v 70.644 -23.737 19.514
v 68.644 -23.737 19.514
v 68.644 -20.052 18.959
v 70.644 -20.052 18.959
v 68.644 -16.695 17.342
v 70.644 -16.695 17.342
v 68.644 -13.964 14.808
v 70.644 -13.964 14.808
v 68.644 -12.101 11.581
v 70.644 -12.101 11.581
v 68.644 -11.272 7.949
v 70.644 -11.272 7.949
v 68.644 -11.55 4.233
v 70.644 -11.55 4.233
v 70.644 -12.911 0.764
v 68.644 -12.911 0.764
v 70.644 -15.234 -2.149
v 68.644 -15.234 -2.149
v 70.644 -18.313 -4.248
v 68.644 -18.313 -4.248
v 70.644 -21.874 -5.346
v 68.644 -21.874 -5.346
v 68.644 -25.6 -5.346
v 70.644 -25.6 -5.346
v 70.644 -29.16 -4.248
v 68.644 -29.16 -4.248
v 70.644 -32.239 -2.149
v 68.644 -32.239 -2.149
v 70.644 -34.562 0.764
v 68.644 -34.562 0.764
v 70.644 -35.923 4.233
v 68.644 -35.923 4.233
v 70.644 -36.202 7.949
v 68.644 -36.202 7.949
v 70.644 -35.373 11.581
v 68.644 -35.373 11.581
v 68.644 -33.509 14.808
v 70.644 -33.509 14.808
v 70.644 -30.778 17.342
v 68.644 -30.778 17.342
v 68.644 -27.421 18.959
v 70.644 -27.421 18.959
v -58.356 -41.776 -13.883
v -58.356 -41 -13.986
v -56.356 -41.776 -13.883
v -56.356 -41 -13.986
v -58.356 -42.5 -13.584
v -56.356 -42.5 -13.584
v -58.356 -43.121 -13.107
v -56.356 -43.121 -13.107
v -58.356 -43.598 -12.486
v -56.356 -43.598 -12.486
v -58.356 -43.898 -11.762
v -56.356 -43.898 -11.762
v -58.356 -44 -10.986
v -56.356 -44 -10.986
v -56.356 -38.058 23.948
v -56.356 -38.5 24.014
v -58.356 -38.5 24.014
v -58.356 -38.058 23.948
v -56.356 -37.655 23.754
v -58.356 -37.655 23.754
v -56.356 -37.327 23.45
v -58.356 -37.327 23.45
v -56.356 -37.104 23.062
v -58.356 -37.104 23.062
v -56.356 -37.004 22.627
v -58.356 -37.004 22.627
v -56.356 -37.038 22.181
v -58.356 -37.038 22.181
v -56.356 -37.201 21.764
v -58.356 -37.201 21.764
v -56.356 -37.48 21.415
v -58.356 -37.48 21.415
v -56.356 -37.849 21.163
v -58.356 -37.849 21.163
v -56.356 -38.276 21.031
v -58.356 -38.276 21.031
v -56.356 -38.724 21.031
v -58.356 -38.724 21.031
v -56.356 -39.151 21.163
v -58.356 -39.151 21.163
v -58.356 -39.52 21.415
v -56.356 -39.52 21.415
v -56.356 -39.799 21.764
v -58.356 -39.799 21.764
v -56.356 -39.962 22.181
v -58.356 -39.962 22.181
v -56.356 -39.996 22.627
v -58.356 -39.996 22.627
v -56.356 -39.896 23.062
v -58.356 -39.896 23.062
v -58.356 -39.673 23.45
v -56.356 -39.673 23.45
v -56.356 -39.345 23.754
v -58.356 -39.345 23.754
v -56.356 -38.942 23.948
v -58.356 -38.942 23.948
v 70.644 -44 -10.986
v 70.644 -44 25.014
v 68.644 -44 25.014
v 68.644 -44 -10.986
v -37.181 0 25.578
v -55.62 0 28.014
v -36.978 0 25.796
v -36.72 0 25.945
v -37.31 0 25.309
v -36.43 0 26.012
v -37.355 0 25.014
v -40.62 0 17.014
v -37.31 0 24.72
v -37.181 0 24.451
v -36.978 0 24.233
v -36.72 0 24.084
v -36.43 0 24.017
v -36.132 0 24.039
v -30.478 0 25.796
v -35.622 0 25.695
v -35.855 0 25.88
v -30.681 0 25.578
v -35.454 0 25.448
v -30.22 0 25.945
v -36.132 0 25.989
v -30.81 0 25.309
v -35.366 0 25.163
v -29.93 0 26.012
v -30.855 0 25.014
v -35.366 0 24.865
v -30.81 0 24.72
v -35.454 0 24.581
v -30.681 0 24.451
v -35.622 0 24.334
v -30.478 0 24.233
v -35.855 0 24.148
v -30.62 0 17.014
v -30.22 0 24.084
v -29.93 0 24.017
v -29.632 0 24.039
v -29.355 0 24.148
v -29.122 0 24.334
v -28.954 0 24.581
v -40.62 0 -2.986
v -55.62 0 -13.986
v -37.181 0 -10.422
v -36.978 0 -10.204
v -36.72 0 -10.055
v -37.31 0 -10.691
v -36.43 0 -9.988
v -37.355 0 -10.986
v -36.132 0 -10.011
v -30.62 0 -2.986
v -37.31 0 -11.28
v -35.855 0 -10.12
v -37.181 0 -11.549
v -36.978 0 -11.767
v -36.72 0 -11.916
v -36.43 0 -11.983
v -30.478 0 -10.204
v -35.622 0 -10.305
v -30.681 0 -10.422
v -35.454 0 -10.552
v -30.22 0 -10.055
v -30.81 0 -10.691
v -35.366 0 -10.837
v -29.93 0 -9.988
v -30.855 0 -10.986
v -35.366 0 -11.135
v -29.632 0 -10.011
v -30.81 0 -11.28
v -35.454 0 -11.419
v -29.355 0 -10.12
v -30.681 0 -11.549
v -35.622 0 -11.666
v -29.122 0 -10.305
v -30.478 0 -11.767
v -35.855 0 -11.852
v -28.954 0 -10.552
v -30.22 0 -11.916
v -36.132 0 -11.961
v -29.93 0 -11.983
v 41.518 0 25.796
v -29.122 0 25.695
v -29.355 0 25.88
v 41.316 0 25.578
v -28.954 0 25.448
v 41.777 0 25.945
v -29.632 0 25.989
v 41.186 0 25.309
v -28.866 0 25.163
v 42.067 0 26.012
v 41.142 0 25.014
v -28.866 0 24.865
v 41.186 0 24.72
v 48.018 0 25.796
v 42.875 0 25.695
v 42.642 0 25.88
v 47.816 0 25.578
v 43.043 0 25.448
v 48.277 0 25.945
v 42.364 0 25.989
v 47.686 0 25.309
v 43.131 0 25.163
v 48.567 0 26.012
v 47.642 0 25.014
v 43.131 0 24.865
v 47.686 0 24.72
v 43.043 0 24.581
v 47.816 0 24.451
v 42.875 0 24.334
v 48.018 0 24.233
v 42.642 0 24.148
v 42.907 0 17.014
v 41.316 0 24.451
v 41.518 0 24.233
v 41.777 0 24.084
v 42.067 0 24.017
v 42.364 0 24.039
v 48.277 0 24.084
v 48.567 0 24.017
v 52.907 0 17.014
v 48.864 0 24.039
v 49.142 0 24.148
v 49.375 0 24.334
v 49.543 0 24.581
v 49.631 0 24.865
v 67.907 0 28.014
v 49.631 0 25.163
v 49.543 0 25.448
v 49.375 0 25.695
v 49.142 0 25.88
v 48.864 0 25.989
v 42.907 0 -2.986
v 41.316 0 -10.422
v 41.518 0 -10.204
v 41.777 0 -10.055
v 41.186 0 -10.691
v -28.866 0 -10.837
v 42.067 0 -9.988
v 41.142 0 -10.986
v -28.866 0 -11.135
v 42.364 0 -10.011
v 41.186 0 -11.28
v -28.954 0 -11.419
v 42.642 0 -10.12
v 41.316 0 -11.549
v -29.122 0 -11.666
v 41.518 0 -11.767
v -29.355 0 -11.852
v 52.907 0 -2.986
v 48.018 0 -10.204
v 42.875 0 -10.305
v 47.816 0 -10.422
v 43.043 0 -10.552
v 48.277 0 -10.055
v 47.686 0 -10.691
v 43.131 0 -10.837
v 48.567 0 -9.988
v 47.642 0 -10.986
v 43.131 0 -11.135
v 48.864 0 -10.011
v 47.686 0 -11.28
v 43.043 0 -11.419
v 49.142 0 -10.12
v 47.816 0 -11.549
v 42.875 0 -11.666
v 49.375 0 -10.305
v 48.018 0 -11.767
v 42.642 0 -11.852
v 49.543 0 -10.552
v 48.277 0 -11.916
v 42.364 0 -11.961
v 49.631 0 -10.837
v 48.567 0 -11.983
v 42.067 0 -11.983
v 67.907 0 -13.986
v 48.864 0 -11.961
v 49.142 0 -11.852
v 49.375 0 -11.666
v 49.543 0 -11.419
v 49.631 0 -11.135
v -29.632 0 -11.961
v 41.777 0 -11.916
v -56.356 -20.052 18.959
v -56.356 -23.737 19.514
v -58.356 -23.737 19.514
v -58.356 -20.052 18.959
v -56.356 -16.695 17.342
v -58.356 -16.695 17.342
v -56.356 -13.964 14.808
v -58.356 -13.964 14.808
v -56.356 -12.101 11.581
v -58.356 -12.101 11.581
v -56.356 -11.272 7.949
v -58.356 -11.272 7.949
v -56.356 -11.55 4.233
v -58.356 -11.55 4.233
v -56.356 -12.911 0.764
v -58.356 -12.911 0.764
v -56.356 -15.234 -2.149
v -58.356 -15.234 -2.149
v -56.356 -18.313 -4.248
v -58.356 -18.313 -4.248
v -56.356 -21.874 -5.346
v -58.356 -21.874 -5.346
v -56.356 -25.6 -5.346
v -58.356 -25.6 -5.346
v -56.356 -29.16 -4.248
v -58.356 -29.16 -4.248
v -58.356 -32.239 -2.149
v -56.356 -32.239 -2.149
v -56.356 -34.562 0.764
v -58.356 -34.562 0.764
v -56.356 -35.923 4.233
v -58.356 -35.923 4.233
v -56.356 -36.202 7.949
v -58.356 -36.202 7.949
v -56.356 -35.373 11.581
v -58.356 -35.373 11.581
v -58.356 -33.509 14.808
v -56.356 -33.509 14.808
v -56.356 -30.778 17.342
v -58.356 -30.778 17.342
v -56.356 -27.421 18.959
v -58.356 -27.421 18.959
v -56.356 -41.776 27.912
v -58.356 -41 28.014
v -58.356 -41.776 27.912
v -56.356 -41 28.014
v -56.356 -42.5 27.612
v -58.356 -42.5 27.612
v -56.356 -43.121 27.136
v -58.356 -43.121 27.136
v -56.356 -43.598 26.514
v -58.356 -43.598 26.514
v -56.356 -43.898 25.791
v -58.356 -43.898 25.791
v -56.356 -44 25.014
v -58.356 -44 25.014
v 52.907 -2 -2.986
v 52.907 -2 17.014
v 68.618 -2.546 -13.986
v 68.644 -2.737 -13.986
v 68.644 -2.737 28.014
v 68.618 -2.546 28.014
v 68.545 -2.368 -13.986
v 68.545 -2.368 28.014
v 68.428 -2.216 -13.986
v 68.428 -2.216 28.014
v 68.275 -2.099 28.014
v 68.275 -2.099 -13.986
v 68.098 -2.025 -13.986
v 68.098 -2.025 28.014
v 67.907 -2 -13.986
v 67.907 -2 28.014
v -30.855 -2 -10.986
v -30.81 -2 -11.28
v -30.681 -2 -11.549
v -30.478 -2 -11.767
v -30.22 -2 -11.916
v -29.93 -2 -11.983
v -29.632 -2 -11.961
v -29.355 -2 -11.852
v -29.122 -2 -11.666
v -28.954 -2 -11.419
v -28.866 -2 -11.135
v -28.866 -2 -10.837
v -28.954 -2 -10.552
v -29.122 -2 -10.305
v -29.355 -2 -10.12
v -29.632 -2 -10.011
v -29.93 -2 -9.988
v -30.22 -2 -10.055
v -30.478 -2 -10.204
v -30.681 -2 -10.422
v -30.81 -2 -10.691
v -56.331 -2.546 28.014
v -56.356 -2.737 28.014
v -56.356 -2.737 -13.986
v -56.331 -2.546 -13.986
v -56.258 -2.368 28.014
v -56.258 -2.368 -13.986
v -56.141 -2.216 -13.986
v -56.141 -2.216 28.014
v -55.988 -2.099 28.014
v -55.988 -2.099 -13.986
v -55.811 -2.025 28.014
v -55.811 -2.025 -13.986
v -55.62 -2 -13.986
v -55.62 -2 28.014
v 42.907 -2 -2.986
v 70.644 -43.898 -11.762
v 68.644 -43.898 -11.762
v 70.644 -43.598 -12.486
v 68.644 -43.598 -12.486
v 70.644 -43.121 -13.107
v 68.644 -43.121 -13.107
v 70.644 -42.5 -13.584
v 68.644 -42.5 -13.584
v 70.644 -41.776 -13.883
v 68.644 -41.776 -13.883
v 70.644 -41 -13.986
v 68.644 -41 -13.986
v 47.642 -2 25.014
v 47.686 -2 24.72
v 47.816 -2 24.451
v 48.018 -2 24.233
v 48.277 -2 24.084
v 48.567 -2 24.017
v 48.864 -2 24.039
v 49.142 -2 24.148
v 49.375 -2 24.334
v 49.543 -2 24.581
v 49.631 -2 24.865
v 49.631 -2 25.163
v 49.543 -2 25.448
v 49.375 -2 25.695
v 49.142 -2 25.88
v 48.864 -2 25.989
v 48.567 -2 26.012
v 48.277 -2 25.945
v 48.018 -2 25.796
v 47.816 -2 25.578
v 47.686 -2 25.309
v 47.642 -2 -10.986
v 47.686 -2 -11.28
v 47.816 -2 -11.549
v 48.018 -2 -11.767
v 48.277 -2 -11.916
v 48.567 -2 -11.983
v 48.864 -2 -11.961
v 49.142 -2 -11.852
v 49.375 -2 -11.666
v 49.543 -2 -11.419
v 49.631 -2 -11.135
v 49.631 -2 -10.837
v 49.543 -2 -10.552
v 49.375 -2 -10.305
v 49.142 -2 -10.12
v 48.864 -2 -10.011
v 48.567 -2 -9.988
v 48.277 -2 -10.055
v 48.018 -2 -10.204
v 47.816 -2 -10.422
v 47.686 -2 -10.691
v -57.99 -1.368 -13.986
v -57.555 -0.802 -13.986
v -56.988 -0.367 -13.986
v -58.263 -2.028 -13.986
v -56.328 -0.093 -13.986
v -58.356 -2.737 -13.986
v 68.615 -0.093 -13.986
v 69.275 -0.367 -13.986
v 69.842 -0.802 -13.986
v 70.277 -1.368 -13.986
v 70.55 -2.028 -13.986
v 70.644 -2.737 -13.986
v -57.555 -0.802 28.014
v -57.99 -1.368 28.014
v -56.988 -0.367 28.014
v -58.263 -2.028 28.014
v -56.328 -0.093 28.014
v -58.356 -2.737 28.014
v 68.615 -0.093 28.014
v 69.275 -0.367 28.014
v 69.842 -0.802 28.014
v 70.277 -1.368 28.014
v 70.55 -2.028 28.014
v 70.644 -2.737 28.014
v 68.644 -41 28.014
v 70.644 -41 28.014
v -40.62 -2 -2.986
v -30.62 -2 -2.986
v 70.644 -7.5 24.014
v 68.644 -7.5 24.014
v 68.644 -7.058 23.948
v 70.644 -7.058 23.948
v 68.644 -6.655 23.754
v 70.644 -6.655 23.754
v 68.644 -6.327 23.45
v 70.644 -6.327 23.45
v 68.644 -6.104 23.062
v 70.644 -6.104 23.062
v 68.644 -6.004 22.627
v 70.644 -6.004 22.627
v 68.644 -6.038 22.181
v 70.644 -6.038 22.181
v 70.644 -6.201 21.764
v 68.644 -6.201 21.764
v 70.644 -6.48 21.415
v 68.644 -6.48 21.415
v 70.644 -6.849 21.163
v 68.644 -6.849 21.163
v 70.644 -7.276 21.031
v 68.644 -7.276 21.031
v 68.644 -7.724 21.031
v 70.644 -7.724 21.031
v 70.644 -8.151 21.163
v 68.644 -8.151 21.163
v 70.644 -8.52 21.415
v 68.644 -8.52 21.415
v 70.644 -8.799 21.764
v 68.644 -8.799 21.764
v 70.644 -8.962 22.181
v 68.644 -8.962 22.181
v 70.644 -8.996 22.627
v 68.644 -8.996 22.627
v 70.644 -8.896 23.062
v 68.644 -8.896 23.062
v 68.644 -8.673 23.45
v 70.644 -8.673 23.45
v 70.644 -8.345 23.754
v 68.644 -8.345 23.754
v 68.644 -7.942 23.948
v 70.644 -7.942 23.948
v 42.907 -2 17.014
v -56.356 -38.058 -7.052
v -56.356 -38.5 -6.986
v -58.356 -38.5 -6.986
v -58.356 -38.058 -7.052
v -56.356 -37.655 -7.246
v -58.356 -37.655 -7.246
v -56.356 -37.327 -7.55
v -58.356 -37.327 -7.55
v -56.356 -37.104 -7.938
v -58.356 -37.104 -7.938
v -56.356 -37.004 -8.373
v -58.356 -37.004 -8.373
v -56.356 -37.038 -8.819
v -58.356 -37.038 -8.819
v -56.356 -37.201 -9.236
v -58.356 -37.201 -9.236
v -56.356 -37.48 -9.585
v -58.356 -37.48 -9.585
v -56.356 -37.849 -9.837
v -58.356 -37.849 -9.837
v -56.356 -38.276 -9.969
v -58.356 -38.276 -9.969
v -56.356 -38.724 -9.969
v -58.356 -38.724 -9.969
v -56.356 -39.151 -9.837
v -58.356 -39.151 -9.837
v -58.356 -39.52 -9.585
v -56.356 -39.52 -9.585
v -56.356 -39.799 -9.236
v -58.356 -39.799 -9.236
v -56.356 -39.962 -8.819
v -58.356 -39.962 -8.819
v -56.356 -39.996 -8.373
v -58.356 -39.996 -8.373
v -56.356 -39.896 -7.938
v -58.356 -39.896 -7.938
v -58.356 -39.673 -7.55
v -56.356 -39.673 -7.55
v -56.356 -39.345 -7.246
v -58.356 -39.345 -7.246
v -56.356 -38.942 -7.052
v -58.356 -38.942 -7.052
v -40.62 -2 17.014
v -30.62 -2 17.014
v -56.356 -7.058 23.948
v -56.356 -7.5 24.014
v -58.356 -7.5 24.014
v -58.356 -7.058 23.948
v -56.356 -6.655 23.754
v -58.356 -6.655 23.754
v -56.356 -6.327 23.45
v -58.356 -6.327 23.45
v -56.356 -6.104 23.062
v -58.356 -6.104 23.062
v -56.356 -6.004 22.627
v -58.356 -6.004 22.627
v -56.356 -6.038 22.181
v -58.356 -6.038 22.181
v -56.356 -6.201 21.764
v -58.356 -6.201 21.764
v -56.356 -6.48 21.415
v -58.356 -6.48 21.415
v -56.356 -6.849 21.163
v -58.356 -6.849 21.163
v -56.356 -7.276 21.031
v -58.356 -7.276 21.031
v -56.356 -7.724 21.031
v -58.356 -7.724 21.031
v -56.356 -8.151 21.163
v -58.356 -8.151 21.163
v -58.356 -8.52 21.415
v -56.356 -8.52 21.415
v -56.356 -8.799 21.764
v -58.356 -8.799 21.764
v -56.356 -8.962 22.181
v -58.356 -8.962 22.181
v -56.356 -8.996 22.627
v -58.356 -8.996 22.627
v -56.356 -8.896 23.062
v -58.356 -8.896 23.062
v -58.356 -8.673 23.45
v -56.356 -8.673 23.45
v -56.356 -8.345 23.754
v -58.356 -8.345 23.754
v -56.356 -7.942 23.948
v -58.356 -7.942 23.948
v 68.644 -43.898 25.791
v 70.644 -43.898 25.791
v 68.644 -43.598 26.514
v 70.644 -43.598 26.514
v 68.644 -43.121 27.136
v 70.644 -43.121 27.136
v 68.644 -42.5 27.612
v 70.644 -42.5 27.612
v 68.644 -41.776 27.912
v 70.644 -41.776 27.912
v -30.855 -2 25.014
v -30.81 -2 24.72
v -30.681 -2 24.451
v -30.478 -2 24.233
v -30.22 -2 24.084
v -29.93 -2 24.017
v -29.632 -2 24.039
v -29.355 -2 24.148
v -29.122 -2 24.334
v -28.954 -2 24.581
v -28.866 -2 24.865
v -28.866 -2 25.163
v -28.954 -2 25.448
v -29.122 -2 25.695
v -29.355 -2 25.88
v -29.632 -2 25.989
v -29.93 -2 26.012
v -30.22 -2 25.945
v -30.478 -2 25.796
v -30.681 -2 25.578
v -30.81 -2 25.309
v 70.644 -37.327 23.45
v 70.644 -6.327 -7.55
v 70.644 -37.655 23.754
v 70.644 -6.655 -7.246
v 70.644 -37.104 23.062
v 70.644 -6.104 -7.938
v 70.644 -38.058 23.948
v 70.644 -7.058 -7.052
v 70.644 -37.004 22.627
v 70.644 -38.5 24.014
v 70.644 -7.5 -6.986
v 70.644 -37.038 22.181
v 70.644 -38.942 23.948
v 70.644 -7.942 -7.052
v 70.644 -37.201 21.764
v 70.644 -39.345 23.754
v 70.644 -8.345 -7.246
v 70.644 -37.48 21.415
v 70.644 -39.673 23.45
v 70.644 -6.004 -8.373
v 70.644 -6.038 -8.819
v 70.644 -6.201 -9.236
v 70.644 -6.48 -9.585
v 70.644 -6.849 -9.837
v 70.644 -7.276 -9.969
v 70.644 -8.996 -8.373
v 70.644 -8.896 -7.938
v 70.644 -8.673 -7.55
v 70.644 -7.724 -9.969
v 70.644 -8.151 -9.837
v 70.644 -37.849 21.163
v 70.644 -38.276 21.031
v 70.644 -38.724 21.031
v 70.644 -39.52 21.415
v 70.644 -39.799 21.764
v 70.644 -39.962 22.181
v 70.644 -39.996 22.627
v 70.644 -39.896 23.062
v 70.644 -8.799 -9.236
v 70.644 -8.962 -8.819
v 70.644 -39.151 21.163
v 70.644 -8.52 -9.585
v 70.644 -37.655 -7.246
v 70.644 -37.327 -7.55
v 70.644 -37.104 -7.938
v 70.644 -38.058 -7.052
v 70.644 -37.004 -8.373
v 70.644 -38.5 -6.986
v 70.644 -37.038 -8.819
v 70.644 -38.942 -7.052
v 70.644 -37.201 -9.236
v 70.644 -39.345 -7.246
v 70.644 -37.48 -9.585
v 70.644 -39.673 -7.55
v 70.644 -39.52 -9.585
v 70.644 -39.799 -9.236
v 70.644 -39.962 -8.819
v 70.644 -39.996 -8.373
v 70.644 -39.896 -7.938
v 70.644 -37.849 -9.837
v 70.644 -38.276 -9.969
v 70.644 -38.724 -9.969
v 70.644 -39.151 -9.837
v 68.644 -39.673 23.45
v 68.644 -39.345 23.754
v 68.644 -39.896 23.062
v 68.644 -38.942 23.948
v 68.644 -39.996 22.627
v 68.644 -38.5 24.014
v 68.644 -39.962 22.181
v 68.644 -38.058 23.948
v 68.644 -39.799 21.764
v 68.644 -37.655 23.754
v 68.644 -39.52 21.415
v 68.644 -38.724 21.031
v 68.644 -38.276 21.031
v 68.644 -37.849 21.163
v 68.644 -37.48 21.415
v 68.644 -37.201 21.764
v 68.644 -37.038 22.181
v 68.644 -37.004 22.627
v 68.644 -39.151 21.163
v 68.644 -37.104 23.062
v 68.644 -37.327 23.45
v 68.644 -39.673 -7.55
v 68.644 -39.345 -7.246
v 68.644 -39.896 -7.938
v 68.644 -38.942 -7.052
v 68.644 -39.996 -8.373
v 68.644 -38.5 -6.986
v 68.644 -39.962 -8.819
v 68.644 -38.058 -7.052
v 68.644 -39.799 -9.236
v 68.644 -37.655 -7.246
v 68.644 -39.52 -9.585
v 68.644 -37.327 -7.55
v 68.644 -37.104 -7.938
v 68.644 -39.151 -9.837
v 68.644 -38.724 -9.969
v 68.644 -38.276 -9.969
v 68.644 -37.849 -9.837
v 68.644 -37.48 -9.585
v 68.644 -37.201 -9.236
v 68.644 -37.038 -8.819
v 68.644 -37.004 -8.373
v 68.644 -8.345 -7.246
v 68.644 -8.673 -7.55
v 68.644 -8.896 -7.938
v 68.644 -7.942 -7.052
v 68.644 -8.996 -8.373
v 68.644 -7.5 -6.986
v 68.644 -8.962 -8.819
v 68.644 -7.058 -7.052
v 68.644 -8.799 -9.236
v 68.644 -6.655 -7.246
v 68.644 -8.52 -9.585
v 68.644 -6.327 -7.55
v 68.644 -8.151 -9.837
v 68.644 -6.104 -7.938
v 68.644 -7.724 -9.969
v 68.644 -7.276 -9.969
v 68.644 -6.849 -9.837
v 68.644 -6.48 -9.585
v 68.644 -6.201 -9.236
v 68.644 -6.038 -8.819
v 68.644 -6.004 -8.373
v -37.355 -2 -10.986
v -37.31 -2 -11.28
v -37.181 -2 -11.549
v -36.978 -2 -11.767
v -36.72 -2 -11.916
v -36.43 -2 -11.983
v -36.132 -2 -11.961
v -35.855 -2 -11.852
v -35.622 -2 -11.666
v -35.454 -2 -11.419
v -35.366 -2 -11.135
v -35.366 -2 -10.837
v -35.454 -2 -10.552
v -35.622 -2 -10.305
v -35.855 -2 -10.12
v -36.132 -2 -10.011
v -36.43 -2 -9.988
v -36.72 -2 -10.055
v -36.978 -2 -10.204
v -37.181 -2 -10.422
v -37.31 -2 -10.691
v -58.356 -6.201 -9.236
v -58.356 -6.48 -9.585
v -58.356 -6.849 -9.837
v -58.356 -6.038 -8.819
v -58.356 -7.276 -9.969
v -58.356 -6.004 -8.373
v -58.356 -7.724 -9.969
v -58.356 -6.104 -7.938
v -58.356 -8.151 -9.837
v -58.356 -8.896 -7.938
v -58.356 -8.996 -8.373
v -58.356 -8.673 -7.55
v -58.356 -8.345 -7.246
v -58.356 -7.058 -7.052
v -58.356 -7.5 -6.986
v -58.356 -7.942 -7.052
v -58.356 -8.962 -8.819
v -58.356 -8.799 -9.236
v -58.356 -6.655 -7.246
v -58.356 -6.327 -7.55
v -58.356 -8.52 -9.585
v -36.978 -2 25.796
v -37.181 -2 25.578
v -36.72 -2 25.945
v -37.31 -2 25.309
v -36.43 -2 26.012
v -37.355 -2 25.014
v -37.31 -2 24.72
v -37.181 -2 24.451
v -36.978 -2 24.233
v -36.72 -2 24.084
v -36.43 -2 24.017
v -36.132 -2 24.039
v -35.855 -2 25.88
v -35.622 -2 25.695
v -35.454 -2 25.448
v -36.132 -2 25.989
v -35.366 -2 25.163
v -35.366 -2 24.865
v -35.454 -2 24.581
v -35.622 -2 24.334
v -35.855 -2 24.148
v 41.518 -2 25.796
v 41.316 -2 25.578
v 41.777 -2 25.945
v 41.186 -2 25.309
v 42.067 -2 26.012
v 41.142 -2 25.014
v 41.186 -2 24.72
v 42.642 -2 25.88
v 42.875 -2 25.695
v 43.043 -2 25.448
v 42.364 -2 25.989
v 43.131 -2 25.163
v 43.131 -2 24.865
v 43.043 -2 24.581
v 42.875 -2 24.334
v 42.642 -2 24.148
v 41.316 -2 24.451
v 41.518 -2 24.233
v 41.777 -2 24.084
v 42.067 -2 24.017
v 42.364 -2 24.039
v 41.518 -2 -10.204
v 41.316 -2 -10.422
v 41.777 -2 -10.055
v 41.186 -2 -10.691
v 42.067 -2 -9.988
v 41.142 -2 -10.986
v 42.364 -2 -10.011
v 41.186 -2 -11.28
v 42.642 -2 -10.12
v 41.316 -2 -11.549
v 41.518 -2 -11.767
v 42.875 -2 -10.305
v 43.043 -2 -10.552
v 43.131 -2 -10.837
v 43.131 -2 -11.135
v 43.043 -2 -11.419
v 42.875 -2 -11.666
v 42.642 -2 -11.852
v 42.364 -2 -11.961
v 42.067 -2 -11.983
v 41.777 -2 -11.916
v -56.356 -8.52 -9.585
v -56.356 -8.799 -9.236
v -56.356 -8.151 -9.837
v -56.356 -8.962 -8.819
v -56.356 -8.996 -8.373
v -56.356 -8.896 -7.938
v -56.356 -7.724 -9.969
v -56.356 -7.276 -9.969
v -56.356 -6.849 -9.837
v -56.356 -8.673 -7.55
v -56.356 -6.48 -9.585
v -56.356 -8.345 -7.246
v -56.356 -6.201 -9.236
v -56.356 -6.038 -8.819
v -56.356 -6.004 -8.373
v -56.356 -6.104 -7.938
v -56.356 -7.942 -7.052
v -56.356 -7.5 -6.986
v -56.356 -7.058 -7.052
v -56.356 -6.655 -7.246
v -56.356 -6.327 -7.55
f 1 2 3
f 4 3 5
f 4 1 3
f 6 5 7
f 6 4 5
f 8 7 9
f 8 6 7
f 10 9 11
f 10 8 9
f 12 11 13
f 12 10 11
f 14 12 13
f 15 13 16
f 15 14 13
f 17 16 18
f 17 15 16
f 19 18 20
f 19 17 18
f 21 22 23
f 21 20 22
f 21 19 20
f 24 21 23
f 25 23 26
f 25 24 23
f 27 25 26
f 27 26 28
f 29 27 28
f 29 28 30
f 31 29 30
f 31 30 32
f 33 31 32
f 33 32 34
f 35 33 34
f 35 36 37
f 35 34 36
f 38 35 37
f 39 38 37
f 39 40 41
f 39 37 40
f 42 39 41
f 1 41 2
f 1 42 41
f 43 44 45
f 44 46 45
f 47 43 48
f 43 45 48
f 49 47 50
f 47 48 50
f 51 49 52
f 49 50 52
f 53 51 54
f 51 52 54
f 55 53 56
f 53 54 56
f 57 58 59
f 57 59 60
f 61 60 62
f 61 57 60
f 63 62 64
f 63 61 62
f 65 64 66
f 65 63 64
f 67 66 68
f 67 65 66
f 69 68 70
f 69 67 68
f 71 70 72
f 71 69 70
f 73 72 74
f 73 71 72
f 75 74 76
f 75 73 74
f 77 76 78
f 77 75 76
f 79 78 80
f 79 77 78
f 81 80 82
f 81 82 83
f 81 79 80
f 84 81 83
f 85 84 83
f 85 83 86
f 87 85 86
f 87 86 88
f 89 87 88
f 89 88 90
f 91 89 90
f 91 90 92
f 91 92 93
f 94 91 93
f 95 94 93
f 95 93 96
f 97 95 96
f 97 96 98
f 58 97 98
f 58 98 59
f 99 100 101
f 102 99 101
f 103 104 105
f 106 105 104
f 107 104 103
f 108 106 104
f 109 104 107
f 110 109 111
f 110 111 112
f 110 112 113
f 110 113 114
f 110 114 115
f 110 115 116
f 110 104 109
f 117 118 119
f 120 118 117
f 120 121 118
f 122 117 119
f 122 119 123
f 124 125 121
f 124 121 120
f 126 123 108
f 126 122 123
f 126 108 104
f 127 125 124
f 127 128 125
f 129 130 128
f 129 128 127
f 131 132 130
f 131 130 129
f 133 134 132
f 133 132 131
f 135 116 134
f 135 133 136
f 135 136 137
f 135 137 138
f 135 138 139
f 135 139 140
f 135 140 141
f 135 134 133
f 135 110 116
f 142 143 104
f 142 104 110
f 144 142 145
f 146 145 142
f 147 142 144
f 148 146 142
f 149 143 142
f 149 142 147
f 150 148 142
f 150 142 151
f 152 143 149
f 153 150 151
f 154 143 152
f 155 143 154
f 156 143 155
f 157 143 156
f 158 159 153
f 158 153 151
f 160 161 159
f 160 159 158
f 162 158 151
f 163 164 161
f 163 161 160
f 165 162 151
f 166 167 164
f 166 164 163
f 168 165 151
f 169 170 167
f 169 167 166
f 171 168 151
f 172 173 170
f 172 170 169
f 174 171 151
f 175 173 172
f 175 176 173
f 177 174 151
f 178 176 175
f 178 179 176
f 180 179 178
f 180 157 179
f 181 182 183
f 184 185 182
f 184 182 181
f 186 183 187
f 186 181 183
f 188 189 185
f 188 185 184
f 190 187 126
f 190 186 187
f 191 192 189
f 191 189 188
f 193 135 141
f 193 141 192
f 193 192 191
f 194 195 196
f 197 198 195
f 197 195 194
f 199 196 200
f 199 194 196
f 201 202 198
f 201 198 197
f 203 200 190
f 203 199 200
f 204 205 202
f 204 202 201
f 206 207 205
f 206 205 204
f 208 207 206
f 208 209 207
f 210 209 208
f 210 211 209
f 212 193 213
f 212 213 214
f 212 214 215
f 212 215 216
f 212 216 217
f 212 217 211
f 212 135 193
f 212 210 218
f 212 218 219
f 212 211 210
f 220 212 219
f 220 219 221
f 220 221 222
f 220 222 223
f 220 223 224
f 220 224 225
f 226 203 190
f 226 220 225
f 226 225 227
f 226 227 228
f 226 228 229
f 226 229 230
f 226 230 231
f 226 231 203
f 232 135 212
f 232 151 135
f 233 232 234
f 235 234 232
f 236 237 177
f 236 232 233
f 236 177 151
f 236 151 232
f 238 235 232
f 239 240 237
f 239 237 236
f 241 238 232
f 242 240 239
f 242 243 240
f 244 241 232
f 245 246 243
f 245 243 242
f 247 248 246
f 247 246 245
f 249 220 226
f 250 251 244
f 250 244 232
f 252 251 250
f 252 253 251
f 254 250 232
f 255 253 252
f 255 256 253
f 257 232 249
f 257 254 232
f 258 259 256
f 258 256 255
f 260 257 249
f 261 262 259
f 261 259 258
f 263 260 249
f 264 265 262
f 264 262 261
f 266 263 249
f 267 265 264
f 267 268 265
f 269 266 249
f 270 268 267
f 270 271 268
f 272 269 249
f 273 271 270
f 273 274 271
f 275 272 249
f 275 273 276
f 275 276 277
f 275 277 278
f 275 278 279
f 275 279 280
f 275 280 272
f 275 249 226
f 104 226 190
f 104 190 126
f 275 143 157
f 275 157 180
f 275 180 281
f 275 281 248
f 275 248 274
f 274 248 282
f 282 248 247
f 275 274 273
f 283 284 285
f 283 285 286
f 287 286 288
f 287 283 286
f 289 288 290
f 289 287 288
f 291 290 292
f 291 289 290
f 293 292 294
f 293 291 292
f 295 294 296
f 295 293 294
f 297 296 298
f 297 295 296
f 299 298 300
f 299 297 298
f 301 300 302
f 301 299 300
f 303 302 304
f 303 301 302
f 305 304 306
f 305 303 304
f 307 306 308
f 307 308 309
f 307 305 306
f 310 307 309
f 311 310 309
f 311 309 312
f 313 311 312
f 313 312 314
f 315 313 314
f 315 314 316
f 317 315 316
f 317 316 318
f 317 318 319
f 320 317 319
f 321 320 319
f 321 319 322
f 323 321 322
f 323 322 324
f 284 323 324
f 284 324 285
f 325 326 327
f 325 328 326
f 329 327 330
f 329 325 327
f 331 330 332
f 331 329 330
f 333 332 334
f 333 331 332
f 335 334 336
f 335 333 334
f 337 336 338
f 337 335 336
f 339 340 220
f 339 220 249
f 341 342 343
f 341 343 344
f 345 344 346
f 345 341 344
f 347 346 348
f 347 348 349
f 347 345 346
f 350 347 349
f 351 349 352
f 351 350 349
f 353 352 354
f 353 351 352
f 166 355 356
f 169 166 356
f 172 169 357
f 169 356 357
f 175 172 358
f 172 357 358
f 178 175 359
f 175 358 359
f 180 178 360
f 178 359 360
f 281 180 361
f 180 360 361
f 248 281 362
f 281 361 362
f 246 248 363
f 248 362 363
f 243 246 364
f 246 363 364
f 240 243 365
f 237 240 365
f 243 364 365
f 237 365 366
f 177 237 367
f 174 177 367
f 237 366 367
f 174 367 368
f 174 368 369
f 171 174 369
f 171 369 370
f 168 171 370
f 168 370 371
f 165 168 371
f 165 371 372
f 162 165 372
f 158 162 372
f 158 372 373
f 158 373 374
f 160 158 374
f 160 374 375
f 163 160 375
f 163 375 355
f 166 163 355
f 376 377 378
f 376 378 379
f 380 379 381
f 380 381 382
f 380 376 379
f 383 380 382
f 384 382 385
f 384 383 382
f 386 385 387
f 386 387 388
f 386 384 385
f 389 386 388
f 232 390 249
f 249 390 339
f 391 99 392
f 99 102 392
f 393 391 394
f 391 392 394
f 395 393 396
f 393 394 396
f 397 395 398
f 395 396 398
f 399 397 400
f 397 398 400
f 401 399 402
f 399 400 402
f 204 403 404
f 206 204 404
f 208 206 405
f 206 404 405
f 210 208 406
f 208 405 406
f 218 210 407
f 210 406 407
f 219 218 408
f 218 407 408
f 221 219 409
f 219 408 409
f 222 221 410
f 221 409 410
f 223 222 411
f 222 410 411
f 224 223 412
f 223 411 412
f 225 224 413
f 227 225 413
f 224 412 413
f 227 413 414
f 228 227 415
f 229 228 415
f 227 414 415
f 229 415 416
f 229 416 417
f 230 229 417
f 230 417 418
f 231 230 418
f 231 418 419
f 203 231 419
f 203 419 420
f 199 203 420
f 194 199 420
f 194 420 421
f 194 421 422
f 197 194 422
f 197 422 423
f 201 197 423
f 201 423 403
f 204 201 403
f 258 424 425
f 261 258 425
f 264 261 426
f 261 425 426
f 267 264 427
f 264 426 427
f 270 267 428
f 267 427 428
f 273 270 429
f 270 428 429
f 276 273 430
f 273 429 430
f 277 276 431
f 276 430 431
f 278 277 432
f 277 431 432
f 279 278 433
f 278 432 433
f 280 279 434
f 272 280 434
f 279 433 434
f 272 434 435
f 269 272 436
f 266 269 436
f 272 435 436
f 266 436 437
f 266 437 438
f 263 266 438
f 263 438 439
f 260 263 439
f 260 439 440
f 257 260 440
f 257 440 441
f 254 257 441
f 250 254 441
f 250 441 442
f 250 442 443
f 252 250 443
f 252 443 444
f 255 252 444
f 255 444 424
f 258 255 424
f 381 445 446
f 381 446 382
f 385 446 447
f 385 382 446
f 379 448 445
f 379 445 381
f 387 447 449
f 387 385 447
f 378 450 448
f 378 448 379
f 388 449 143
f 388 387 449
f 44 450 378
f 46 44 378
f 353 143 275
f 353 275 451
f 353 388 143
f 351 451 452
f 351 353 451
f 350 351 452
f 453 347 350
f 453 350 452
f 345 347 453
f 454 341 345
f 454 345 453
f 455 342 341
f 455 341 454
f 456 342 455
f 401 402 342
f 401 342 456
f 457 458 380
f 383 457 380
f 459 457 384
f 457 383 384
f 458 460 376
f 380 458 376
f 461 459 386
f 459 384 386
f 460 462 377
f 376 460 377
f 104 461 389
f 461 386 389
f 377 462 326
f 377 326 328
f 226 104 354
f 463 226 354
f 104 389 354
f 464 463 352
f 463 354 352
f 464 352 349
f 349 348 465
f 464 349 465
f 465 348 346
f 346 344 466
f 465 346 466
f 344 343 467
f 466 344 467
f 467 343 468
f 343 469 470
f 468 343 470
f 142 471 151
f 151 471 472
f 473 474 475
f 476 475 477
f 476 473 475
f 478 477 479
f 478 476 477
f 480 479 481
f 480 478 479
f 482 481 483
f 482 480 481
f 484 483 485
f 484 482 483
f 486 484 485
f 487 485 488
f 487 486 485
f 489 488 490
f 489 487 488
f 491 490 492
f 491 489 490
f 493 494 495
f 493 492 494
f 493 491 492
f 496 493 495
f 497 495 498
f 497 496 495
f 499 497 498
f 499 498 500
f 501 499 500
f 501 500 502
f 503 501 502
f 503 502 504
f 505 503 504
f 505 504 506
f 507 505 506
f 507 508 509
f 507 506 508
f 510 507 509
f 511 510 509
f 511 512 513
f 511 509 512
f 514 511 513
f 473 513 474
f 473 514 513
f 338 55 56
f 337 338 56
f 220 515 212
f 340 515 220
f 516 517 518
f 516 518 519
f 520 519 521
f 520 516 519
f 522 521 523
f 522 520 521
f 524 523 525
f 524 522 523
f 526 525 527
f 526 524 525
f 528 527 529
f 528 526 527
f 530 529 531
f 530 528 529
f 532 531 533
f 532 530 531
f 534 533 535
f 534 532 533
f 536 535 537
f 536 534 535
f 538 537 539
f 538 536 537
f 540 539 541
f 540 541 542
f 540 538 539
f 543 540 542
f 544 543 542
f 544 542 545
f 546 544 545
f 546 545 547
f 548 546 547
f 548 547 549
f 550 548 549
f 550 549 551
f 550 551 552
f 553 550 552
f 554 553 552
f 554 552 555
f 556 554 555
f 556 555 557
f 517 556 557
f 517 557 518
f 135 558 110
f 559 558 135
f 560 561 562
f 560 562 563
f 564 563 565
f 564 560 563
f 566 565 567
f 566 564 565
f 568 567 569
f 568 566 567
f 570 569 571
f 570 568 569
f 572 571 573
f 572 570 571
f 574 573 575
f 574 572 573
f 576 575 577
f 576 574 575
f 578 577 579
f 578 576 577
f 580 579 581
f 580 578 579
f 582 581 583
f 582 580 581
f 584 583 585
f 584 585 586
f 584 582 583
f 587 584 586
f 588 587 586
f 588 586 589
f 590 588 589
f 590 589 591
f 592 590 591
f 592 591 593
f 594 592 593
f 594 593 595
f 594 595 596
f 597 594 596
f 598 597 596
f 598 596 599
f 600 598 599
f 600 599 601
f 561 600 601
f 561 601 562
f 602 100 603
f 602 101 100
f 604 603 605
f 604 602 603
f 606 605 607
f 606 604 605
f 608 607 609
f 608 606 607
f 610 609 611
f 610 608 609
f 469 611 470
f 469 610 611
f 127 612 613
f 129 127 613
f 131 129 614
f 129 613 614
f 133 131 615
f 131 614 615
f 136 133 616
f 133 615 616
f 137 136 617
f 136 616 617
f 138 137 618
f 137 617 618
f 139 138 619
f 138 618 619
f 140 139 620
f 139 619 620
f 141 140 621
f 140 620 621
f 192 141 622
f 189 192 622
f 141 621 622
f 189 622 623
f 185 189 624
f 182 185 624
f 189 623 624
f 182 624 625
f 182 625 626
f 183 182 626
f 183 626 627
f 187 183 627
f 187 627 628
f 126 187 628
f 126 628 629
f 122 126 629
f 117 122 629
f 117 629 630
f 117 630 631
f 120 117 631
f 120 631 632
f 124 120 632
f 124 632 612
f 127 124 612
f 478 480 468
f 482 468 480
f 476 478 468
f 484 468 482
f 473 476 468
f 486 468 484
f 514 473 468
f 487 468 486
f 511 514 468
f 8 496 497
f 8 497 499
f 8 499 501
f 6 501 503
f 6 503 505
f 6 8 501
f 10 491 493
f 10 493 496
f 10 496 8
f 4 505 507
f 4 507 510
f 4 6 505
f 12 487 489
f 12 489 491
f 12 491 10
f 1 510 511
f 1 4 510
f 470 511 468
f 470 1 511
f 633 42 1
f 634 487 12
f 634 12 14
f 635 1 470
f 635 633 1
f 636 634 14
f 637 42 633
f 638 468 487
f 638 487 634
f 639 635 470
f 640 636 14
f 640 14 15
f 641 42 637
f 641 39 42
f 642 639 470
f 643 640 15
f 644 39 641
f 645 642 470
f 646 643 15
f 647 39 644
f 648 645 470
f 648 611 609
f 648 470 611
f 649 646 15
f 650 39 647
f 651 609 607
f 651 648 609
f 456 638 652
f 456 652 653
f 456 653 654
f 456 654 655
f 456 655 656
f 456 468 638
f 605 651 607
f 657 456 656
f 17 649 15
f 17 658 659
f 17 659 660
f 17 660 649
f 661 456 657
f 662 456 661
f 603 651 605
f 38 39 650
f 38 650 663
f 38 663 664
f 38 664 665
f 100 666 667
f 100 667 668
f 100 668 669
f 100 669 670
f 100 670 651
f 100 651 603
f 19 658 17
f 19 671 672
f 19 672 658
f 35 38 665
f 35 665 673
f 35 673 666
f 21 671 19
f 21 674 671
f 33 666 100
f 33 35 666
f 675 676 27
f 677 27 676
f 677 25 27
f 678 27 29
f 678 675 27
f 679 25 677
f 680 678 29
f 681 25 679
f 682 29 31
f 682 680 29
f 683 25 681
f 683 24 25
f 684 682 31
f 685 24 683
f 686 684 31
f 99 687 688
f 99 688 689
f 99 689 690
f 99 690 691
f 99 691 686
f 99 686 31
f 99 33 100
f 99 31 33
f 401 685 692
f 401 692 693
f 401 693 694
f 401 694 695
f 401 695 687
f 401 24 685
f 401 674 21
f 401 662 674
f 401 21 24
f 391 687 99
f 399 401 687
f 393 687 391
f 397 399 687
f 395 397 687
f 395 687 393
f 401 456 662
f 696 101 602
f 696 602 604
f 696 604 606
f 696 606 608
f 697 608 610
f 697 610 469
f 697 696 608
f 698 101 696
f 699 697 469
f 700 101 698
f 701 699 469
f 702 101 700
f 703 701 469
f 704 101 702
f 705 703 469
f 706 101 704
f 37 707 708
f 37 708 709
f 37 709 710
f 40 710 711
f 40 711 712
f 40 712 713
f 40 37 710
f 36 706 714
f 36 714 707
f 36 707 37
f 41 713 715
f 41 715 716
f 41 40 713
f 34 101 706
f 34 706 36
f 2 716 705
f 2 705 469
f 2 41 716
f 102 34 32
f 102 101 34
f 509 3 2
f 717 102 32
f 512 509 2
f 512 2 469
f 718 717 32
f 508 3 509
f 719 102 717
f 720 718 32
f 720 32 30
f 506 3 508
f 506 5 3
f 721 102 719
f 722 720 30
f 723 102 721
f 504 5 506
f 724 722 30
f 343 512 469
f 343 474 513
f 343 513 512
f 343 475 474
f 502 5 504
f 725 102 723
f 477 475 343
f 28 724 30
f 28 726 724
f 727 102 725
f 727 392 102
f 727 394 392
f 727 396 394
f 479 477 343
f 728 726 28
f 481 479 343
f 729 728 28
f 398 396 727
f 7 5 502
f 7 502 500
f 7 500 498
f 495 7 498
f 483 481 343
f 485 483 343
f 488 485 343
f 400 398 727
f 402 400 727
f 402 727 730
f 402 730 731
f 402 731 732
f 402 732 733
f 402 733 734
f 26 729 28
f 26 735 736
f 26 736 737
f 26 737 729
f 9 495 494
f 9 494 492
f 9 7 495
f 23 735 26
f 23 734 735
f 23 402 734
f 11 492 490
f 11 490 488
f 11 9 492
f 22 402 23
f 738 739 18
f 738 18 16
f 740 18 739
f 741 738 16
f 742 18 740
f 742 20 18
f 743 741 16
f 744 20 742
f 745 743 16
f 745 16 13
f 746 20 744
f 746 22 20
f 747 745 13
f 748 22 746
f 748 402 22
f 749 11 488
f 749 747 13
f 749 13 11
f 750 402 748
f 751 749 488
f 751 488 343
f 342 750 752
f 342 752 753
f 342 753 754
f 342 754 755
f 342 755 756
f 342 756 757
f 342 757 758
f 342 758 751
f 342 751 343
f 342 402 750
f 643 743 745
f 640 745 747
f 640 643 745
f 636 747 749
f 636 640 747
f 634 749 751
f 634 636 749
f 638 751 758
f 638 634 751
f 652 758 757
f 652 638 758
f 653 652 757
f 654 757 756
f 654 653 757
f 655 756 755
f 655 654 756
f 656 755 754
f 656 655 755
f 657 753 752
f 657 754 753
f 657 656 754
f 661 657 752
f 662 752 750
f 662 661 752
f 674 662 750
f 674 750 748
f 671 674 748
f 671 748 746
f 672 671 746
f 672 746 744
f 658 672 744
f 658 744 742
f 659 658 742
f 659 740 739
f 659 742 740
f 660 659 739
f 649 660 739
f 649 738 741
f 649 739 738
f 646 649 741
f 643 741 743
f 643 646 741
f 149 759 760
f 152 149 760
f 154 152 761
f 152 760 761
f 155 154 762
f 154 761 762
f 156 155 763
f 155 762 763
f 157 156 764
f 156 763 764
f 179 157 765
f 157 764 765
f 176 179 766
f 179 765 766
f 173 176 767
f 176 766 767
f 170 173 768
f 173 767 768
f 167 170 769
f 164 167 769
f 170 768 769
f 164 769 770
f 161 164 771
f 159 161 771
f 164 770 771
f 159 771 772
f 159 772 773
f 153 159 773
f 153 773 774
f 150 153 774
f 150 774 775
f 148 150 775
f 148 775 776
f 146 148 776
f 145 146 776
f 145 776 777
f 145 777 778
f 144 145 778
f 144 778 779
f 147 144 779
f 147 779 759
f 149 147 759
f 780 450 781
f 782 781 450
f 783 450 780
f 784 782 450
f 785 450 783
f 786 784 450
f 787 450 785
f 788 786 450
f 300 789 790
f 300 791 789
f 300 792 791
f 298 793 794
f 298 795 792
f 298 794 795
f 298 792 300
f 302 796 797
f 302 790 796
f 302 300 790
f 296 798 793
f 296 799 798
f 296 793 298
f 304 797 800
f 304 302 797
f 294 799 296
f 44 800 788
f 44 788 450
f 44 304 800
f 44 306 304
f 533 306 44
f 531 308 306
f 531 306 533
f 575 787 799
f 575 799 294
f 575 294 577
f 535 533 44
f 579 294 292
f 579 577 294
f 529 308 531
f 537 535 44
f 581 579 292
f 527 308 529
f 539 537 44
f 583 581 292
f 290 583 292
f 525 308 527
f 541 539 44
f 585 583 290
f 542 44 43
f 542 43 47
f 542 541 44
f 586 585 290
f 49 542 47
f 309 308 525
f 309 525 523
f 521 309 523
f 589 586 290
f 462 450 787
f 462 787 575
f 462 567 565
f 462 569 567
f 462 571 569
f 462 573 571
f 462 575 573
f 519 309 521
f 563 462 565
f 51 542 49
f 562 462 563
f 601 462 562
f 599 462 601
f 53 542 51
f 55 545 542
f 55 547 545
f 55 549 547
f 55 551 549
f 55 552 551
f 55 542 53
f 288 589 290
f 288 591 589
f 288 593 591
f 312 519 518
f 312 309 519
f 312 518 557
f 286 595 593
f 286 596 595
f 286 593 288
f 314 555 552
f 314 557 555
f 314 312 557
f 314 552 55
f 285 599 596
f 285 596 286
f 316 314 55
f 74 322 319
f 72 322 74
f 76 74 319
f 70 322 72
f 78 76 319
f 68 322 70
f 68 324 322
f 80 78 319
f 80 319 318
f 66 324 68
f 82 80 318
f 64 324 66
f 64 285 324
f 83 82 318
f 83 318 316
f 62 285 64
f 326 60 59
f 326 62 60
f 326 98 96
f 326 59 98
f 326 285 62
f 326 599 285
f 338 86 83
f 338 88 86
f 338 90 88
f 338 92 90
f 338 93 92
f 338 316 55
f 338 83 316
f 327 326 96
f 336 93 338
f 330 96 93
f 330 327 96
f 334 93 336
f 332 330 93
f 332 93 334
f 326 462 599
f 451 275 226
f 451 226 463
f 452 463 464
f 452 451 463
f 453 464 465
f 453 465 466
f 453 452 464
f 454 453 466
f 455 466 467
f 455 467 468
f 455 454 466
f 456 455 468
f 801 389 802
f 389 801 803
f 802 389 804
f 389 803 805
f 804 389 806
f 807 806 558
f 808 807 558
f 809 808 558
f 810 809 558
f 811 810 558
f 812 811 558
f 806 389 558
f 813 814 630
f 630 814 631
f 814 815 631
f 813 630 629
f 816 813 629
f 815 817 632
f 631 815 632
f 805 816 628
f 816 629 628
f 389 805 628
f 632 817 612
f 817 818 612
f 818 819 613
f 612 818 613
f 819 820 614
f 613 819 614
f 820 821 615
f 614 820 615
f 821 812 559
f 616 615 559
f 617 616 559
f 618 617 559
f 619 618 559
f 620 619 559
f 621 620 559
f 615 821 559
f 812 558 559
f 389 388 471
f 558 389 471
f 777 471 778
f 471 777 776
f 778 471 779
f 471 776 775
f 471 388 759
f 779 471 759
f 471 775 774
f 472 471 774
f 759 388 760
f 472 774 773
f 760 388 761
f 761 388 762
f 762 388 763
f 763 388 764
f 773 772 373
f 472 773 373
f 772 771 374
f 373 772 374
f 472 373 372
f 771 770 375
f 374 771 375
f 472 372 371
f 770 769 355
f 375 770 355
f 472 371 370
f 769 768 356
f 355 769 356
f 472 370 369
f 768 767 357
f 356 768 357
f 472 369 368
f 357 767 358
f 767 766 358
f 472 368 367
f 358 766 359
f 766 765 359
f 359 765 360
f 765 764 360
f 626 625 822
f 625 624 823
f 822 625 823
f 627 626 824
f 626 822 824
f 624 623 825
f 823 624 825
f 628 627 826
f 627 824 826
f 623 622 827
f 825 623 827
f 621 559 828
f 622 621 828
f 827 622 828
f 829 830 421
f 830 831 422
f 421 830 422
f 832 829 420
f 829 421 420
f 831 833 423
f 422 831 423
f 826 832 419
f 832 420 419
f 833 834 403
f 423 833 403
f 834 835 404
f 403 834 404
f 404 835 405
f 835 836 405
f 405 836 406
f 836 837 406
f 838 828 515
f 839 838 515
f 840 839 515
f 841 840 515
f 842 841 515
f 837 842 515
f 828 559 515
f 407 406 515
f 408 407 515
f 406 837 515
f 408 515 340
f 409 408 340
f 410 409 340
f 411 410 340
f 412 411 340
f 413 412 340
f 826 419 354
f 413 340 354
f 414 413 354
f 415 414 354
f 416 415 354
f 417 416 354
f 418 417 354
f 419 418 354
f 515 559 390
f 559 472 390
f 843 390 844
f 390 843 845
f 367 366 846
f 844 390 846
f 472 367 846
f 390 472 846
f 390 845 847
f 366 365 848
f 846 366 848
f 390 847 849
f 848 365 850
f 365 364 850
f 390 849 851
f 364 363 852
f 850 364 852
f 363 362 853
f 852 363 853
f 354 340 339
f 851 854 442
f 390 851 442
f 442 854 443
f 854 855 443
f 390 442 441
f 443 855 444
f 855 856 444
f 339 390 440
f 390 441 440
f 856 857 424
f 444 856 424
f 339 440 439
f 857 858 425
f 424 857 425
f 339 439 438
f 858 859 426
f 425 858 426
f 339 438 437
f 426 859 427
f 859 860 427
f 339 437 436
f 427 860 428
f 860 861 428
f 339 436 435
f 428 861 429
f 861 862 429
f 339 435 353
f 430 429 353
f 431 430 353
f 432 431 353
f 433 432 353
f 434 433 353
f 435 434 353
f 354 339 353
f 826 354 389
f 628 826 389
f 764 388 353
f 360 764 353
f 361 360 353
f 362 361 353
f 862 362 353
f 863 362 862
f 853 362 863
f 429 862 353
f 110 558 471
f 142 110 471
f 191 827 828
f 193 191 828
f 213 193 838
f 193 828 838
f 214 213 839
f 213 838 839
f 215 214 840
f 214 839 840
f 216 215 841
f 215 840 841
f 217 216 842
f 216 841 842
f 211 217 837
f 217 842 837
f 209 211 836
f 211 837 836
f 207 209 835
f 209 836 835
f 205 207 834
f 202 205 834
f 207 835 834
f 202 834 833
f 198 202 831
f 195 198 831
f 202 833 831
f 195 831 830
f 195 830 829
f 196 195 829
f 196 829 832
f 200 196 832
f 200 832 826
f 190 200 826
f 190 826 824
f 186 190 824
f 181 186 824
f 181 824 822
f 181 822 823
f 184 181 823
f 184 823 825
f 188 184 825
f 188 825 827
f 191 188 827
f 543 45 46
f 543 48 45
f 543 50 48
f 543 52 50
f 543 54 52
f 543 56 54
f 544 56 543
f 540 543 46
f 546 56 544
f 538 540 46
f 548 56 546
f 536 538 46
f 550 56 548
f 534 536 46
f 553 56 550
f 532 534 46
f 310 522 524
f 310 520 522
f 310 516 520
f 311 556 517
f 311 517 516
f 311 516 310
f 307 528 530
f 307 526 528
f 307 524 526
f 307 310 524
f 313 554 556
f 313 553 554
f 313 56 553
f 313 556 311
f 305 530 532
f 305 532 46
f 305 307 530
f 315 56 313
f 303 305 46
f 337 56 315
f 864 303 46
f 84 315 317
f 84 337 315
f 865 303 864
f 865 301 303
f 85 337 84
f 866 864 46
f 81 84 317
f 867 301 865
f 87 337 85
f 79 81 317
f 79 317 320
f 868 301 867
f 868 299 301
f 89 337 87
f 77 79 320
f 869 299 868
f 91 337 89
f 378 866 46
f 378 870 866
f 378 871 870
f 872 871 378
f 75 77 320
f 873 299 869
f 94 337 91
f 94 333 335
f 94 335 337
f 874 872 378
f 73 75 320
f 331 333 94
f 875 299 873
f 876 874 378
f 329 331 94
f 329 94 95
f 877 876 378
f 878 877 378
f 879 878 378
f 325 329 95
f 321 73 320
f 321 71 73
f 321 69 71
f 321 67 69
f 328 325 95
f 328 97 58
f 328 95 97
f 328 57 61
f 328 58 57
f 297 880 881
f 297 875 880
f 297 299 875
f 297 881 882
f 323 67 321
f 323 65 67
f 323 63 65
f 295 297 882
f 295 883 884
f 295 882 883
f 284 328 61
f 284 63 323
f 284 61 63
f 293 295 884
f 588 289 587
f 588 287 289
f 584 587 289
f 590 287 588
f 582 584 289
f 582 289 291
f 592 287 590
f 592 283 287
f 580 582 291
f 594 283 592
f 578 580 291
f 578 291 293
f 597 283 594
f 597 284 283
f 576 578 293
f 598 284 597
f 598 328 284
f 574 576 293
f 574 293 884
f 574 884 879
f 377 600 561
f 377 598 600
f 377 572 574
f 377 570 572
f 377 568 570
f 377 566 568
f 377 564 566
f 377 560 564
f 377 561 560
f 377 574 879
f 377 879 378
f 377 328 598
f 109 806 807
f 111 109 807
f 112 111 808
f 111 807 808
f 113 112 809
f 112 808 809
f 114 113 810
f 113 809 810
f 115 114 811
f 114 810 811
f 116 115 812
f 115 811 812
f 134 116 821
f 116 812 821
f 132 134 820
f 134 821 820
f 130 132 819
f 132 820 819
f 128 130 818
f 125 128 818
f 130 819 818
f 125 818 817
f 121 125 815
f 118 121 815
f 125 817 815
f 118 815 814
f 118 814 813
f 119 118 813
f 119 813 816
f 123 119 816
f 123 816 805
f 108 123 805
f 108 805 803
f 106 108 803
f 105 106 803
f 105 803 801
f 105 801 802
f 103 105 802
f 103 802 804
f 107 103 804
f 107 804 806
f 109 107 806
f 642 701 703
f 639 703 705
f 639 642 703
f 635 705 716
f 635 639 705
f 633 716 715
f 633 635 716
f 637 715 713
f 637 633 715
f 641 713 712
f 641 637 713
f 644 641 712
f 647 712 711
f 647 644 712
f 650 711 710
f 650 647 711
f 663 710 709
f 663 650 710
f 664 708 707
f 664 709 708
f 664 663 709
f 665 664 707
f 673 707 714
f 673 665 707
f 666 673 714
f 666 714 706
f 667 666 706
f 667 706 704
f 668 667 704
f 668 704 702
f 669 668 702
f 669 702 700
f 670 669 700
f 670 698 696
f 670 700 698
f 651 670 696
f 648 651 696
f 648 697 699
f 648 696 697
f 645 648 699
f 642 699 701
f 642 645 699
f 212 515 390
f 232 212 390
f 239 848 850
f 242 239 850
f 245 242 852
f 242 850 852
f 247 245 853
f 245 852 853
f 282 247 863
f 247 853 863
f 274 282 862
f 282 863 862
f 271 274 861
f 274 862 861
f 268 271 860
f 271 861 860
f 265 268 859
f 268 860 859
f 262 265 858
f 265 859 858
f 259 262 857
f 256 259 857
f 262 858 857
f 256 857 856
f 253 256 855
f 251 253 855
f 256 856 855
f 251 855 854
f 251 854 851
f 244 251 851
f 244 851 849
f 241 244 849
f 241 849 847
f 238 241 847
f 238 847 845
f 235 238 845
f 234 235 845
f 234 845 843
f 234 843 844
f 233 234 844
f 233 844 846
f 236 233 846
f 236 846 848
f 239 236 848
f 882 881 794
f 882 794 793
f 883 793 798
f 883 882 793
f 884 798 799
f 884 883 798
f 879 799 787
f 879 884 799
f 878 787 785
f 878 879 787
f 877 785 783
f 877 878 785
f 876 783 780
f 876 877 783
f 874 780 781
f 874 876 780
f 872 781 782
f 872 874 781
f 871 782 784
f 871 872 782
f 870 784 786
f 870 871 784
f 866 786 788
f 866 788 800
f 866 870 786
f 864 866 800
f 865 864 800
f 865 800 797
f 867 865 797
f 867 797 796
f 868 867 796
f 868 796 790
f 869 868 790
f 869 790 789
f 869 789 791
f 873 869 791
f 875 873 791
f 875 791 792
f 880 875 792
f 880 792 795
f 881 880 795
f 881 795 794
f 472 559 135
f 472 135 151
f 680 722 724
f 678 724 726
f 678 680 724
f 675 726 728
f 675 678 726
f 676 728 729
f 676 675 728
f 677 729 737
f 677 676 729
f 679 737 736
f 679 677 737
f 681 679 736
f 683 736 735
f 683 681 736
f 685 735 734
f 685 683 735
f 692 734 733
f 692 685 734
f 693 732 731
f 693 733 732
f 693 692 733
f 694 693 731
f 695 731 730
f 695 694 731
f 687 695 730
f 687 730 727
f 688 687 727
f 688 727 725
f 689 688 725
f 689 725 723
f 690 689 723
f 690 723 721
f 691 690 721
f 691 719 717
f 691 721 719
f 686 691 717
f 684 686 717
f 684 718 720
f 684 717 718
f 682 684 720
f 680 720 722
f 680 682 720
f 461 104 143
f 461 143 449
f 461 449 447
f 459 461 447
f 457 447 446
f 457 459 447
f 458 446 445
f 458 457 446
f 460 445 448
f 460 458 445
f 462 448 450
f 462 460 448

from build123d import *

# Parameters (mm, degrees)
SKETCH_1_W                         = 125
SKETCH_1_H                         = 42
SM_BASE_FLANGE_490_DEPTH           = 2
SM_EDGE_FLANGE_503_STRIP_W         = 9.4732
SM_EDGE_FLANGE_503_STRIP_H         = 2
SM_EDGE_FLANGE_503_STRIP_CUT_DEPTH = 42
SM_EDGE_FLANGE_503_DEPTH           = 42
SM_EDGE_FLANGE_662_STRIP_W         = 9.4732
SM_EDGE_FLANGE_662_STRIP_H         = 2
SM_EDGE_FLANGE_662_STRIP_CUT_DEPTH = 42
SM_EDGE_FLANGE_662_DEPTH           = 42
FILLET_810_R                       = 3
EXTRUDE_START                      = -129
EXTRUDE_1524_OUTLINE_R             = 1.5
EXTRUDE_1524_OUTLINE_R_2           = 12.5
EXTRUDE_1524_DEPTH                 = 129
EXTRUDE_START_2                    = -2
EXTRUDE_2057_OUTLINE_W             = 10
EXTRUDE_2057_OUTLINE_H             = 20
EXTRUDE_2057_DEPTH                 = 2
HOLE_WIZARD_M2_D                   = 2


# Read off the part's stored shape, not the designer's step: 电机螺丝孔, 车架接口
# Sheet-metal steps are written as plain solids
with BuildPart() as part:
    # Sketch 1 → Sm Base Flange 490 (new body)
    with BuildSketch(Plane(origin=(0, 0, 0), x_dir=(1, 0, 0), z_dir=(0, 1, 0))):
        with Locations((6.143518865, -7.014413587)):
            Rectangle(SKETCH_1_W, SKETCH_1_H)
    extrude(amount=-SM_BASE_FLANGE_490_DEPTH)

    # Sm Edge Flange 503 strip (across the edge) → Sm Edge Flange 503 strip cut (cut)
    with BuildSketch(Plane(origin=(-56.356481135, -2, 28.014413587), x_dir=(1, 0, 0), z_dir=(0, 0, -1))):
        with Locations((-4, -1)):
            Rectangle(SM_EDGE_FLANGE_503_STRIP_W, SM_EDGE_FLANGE_503_STRIP_H)
    extrude(amount=SM_EDGE_FLANGE_503_STRIP_CUT_DEPTH, mode=Mode.SUBTRACT)

    # Sm Edge Flange 503 section (across the edge) → Sm Edge Flange 503 (add)
    with BuildSketch(Plane(origin=(-56.356481135, -2, 28.014413587), x_dir=(1, 0, 0), z_dir=(0, 0, -1))):
        with BuildLine():
            Line((-2, 0.7366), (-2, 42))
            Line((-2, 42), (0, 42))
            Line((0, 42), (0, 0.7366))
            ThreePointArc((0, 0.7366), (0.215745145, 0.215745145), (0.7366, 0))
            Line((0.7366, 0), (0.7366, -2))
            ThreePointArc((0.7366, -2), (-1.198468417, -1.198468417), (-2, 0.7366))
        make_face()
    extrude(amount=SM_EDGE_FLANGE_503_DEPTH)

    # Sm Edge Flange 662 strip (across the edge) → Sm Edge Flange 662 strip cut (cut)
    with BuildSketch(Plane(origin=(68.643518865, -2, -13.985586413), x_dir=(-1, 0, 0), z_dir=(0, 0, 1))):
        with Locations((-4, -1)):
            Rectangle(SM_EDGE_FLANGE_662_STRIP_W, SM_EDGE_FLANGE_662_STRIP_H)
    extrude(amount=SM_EDGE_FLANGE_662_STRIP_CUT_DEPTH, mode=Mode.SUBTRACT)

    # Sm Edge Flange 662 section (across the edge) → Sm Edge Flange 662 (add)
    with BuildSketch(Plane(origin=(68.643518865, -2, -13.985586413), x_dir=(-1, 0, 0), z_dir=(0, 0, 1))):
        with BuildLine():
            Line((-2, 0.7366), (-2, 42))
            Line((-2, 42), (0, 42))
            Line((0, 42), (0, 0.7366))
            ThreePointArc((0, 0.7366), (0.215745145, 0.215745145), (0.7366, 0))
            Line((0.7366, 0), (0.7366, -2))
            ThreePointArc((0.7366, -2), (-1.198468417, -1.198468417), (-2, 0.7366))
        make_face()
    extrude(amount=SM_EDGE_FLANGE_662_DEPTH)

    # Fillet 810
    fillet_810_edges = [part.edges().sort_by_distance(p)[0] for p in [
        (-57.356481135, -44, 28.014413587),
        (-57.356481135, -44, -13.985586413),
        (69.643518865, -44, -13.985586413),
        (69.643518865, -44, 28.014413587),
    ]]
    fillet(fillet_810_edges, radius=FILLET_810_R)

    # Extrude 1524 outline → Extrude 1524 (cut)
    with BuildSketch(Plane.ZY.offset(58.356481135).offset(EXTRUDE_START)):
        with Locations((-8.485586413, -7.5)):
            Circle(EXTRUDE_1524_OUTLINE_R)
        with Locations((22.514413587, -7.5)):
            Circle(EXTRUDE_1524_OUTLINE_R)
        with Locations((22.514413587, -38.5)):
            Circle(EXTRUDE_1524_OUTLINE_R)
        with Locations((-8.485586413, -38.5)):
            Circle(EXTRUDE_1524_OUTLINE_R)
        with Locations((7.014413587, -23.7366)):
            Circle(EXTRUDE_1524_OUTLINE_R_2)
    extrude(amount=EXTRUDE_1524_DEPTH, mode=Mode.SUBTRACT)

    # Extrude 2057 outline → Extrude 2057 (cut)
    with BuildSketch(Plane(origin=(0, 0, 0), x_dir=(1, 0, 0), z_dir=(0, 1, 0)).offset(EXTRUDE_START_2)):
        with Locations((47.906918865, -7.014413587)):
            Rectangle(EXTRUDE_2057_OUTLINE_W, EXTRUDE_2057_OUTLINE_H)
        with Locations((-35.619881135, -7.014413587)):
            Rectangle(EXTRUDE_2057_OUTLINE_W, EXTRUDE_2057_OUTLINE_H)
    extrude(amount=EXTRUDE_2057_DEPTH, mode=Mode.SUBTRACT)

    # M2螺纹孔 (through all)
    with Locations(Plane(origin=(0, 0, 0), x_dir=(1, 0, 0), z_dir=(0, 1, 0))):
        with Locations((-29.854881135, 10.985586413), (42.141918865, 10.985586413), (42.141918865, -25.014413587), (-29.854881135, -25.014413587), (-36.354881135, 10.985586413), (48.641918865, 10.985586413), (48.641918865, -25.014413587), (-36.354881135, -25.014413587)):
            Hole(HOLE_WIZARD_M2_D / 2)


solid = part.part
